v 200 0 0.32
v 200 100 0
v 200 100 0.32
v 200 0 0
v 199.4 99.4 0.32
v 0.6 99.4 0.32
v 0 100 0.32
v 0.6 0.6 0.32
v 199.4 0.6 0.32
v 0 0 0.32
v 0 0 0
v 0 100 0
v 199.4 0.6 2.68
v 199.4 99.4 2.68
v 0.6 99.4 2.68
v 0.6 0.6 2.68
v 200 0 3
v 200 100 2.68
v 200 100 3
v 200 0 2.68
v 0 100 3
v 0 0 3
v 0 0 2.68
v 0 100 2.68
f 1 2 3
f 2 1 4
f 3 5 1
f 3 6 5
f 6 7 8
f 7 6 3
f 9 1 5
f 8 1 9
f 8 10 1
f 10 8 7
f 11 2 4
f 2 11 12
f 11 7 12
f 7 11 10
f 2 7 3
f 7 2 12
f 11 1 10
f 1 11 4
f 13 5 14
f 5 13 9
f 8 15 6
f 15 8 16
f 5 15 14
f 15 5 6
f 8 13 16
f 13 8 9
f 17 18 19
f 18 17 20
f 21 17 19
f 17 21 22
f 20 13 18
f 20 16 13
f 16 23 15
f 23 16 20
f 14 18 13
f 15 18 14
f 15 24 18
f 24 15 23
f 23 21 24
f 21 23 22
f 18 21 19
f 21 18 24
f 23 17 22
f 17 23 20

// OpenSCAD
// Sheet DiBond (aluminum composite panel): aluminum skin + polyethylene core + aluminum skin
// One connected solid with visually distinguishable layers (via slight in-plane inset + overlap)

module dibond_sheet(width=200, height=100, thickness=3, skin=0.3) {
    eps = 0.02;                       // tiny overlap to guarantee watertight union
    skin_t = max(skin, 0.05);
    core_t = max(thickness - 2*skin_t, 0.01);

    // Small inset so the core is visible from the sides (material distinction)
    inset = min(0.6, width/20, height/20);

    union() {
        // Bottom aluminum skin (full size)
        translate([0, 0, 0])
            cube([width, height, skin_t + eps], center=false);

        // Polyethylene core (slightly inset in X/Y so it shows on edges)
        translate([inset, inset, skin_t - eps])
            cube([width - 2*inset, height - 2*inset, core_t + 2*eps], center=false);

        // Top aluminum skin (full size)
        translate([0, 0, skin_t + core_t - eps])
            cube([width, height, skin_t + eps], center=false);
    }
}

// Main model
dibond_sheet();
